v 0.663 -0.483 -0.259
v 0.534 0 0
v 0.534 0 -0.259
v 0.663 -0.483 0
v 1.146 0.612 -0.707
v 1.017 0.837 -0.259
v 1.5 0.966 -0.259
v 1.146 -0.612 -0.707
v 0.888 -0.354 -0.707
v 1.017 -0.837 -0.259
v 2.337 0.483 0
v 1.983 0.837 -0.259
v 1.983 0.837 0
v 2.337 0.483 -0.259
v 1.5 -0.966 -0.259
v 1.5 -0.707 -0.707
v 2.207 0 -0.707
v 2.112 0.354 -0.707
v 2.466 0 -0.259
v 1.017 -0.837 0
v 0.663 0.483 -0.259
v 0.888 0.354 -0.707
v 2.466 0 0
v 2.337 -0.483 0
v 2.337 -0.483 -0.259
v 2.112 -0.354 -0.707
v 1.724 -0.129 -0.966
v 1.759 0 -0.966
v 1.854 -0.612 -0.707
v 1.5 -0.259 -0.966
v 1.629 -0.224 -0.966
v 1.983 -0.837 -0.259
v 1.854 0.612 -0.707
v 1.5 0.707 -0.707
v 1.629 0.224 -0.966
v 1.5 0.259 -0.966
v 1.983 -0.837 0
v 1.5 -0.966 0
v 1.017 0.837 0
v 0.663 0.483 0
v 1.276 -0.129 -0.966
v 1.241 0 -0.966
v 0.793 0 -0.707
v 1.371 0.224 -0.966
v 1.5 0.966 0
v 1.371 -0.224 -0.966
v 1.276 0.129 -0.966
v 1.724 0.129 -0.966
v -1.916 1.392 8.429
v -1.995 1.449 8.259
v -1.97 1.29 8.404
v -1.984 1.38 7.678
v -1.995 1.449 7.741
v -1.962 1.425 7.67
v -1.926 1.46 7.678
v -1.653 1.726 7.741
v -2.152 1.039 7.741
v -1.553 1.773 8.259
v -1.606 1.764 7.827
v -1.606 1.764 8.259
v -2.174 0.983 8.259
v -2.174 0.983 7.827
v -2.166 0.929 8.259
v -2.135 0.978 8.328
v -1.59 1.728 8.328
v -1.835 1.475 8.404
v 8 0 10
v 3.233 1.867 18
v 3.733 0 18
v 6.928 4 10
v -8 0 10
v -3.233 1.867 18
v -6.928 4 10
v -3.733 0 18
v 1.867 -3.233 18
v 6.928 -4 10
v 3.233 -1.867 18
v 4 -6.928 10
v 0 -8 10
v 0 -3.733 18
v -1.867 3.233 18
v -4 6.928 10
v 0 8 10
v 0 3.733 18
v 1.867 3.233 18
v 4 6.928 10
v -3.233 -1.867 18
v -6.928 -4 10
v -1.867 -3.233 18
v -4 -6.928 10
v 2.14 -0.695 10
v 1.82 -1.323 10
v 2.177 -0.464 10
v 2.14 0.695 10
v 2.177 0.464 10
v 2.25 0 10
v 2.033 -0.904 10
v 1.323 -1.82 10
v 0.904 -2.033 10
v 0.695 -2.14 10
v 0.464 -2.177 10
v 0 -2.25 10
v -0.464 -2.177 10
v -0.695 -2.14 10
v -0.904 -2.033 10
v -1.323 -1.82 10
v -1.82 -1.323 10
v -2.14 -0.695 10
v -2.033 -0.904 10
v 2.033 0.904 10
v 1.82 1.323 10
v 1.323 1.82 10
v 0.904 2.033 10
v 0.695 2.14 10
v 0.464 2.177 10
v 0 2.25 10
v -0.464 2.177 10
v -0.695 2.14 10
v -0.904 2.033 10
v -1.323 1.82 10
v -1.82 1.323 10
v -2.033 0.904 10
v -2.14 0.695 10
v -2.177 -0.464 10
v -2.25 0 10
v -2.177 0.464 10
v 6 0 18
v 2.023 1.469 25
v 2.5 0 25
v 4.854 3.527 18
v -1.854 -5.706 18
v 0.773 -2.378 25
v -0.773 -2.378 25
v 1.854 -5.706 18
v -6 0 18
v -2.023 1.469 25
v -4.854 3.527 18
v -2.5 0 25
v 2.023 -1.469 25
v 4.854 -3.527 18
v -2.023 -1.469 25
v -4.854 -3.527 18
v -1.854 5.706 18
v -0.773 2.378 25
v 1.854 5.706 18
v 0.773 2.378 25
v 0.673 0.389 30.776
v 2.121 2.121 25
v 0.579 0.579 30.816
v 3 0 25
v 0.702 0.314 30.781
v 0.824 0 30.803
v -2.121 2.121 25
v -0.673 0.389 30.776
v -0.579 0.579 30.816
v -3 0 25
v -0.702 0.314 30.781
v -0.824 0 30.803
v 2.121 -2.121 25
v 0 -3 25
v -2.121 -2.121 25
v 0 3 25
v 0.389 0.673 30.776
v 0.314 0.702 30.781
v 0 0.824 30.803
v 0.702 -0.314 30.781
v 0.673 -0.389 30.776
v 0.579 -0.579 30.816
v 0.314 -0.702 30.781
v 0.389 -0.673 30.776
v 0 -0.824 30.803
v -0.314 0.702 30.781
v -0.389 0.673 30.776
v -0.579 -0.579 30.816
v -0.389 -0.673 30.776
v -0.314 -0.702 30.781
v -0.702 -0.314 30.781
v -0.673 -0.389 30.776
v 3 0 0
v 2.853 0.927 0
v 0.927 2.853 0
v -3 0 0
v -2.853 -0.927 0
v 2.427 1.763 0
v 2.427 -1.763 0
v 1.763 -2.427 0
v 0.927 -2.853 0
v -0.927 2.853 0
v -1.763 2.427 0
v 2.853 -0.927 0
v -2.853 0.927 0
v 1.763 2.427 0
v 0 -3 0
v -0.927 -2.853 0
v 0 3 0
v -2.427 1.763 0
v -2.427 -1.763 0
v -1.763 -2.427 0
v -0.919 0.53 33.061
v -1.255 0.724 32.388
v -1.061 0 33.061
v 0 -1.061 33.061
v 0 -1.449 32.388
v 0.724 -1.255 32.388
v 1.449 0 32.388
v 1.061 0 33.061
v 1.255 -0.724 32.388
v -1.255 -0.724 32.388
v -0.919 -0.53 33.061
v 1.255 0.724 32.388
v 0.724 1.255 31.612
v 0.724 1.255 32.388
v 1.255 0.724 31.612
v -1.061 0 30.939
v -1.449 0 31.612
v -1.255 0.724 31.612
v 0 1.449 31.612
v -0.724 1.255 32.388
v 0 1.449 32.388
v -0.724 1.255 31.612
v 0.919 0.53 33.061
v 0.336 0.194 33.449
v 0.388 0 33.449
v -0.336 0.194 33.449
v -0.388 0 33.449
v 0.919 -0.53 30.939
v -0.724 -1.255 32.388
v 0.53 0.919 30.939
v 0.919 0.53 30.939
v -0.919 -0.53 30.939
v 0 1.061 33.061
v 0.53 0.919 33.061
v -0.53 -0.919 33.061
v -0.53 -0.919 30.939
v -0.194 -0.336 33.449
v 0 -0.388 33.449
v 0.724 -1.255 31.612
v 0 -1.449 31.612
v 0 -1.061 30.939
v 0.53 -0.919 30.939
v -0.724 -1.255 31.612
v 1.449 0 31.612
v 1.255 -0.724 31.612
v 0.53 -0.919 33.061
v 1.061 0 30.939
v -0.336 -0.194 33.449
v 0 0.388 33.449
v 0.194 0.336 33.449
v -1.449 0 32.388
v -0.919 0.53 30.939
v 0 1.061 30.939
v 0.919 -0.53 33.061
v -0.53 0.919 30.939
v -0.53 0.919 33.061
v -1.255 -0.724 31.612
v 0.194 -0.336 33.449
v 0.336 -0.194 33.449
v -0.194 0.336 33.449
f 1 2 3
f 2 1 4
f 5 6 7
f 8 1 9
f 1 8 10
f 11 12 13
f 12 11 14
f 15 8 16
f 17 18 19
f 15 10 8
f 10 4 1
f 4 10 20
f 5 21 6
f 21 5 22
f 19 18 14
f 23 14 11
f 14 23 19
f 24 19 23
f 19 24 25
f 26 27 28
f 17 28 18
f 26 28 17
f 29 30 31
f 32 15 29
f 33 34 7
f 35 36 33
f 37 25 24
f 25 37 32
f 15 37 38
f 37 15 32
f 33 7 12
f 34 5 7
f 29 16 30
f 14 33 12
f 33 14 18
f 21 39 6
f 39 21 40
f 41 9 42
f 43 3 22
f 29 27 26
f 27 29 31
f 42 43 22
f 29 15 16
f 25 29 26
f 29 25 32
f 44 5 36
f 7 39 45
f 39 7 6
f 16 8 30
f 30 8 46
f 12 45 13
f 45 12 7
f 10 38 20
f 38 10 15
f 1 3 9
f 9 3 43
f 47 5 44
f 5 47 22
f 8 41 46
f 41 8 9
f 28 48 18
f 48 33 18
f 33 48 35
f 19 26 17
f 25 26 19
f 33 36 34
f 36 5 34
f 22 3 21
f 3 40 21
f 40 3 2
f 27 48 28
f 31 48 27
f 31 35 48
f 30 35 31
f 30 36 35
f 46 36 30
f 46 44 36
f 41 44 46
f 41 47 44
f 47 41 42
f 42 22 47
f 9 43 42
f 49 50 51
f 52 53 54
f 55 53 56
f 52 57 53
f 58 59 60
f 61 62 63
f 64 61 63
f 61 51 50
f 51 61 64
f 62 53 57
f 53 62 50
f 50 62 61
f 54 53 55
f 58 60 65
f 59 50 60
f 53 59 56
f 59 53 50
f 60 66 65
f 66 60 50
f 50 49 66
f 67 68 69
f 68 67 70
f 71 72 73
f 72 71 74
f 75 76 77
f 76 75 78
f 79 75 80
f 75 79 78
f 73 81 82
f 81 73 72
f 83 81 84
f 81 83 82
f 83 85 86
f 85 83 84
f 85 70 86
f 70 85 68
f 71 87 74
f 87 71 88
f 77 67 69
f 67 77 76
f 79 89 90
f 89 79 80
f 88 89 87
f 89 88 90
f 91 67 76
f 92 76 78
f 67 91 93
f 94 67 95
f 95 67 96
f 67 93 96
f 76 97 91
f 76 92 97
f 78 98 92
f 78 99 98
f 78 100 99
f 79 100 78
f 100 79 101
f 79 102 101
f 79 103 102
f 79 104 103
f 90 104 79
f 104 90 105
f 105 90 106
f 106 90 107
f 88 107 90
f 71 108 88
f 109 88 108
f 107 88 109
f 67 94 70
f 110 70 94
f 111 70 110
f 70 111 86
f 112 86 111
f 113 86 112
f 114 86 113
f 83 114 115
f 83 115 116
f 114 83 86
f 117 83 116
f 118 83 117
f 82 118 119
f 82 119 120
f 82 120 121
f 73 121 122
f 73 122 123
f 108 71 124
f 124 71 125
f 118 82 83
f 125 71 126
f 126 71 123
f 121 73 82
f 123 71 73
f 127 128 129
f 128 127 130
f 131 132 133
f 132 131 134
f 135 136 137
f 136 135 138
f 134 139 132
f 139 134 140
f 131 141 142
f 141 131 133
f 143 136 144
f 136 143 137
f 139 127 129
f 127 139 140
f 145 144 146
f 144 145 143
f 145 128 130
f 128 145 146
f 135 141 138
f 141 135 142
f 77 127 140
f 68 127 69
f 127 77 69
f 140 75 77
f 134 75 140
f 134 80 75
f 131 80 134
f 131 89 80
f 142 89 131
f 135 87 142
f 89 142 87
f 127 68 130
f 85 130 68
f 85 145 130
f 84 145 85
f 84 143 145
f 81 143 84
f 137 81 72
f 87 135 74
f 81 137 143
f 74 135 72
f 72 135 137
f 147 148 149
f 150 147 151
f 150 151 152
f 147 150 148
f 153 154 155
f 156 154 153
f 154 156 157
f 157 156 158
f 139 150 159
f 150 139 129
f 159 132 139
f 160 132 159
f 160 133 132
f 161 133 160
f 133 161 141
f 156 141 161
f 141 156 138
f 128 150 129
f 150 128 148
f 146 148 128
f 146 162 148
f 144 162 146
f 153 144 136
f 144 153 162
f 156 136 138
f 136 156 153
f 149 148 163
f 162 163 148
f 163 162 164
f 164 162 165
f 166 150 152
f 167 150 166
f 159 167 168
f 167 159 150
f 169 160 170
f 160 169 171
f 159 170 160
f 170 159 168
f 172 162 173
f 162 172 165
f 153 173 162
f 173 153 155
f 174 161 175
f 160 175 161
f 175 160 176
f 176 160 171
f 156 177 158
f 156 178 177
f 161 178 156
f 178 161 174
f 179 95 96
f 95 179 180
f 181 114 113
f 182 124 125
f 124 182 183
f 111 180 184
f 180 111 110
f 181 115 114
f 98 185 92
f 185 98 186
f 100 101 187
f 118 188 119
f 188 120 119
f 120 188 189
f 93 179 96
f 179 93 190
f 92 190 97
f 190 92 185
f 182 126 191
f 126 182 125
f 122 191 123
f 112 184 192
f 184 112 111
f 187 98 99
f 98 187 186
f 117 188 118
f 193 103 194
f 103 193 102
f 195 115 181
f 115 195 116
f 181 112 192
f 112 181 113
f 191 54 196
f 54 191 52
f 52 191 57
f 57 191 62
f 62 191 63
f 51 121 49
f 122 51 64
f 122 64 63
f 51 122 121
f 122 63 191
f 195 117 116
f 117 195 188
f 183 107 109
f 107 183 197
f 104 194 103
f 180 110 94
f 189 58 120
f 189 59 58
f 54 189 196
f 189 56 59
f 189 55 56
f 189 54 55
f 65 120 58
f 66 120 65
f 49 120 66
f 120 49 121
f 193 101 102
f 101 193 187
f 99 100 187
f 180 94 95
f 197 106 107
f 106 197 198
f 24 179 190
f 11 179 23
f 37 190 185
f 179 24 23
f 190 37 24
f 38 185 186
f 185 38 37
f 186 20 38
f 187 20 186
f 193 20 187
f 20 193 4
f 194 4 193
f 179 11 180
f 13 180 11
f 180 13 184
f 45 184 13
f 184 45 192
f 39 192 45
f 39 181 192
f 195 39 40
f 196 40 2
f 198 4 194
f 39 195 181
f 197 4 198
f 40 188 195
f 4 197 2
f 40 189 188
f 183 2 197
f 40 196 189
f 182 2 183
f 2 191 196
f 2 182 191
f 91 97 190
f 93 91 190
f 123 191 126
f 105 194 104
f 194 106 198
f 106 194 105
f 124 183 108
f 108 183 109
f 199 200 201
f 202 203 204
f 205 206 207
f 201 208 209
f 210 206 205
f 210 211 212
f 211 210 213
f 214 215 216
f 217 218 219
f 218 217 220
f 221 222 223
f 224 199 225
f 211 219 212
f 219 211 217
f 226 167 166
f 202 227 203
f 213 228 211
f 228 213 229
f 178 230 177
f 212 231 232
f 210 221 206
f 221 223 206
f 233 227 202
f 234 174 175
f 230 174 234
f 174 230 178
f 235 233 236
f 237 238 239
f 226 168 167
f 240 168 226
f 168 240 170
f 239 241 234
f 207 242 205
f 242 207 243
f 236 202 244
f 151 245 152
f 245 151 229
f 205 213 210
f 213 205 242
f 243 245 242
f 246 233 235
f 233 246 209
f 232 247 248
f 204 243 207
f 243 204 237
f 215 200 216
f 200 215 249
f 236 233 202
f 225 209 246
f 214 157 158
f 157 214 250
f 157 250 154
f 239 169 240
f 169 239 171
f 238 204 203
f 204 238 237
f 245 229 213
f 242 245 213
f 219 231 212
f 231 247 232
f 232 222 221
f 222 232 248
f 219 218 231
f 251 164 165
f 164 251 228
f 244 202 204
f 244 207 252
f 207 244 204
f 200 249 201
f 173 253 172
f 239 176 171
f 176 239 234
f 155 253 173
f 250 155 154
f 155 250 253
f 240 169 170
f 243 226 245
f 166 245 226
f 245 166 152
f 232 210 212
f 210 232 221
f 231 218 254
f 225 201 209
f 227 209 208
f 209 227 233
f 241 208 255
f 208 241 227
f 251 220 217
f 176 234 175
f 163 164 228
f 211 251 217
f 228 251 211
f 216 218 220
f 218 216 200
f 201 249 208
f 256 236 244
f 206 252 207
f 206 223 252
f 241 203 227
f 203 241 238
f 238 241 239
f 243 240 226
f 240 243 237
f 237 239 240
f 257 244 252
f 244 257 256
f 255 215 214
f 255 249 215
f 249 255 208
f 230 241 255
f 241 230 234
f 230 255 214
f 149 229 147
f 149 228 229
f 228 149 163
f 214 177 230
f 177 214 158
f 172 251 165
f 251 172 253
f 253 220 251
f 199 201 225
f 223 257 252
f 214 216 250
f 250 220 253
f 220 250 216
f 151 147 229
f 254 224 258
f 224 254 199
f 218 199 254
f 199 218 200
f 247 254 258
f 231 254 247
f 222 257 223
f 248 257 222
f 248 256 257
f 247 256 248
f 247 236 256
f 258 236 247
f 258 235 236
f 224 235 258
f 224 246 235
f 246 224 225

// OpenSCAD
// A stylized pine tree with a textured trunk.
// Generated for: 2026-07-10 | Tree

module pine_tree() {
    // Trunk
    color("Sienna")
    cylinder(h = 20, r1 = 3, r2 = 1.5, $fn = 20);
    
    // Texture on trunk (bumps)
    for (i = [0 : 5]) {
        translate([0, 0, i * 4])
        rotate([0, 0, i * 72])
        translate([1.5, 0, 0])
        sphere(r = 1, $fn = 12);
    }

    // Leaves - multiple layers of cones
    color("ForestGreen") {
        // Bottom layer
        translate([0, 0, 10])
        cylinder(h = 15, r1 = 8, r2 = 0, $fn = 12);
        
        // Middle layer
        translate([0, 0, 18])
        cylinder(h = 12, r1 = 6, r2 = 0, $fn = 10);
        
        // Top layer
        translate([0, 0, 25])
        cylinder(h = 8, r1 = 3, r2 = 0, $fn = 8);
    }
    
    // Topmost tip
    color("ForestGreen")
    translate([0, 0, 32])
    sphere(r = 1.5, $fn = 12);
}

pine_tree();
